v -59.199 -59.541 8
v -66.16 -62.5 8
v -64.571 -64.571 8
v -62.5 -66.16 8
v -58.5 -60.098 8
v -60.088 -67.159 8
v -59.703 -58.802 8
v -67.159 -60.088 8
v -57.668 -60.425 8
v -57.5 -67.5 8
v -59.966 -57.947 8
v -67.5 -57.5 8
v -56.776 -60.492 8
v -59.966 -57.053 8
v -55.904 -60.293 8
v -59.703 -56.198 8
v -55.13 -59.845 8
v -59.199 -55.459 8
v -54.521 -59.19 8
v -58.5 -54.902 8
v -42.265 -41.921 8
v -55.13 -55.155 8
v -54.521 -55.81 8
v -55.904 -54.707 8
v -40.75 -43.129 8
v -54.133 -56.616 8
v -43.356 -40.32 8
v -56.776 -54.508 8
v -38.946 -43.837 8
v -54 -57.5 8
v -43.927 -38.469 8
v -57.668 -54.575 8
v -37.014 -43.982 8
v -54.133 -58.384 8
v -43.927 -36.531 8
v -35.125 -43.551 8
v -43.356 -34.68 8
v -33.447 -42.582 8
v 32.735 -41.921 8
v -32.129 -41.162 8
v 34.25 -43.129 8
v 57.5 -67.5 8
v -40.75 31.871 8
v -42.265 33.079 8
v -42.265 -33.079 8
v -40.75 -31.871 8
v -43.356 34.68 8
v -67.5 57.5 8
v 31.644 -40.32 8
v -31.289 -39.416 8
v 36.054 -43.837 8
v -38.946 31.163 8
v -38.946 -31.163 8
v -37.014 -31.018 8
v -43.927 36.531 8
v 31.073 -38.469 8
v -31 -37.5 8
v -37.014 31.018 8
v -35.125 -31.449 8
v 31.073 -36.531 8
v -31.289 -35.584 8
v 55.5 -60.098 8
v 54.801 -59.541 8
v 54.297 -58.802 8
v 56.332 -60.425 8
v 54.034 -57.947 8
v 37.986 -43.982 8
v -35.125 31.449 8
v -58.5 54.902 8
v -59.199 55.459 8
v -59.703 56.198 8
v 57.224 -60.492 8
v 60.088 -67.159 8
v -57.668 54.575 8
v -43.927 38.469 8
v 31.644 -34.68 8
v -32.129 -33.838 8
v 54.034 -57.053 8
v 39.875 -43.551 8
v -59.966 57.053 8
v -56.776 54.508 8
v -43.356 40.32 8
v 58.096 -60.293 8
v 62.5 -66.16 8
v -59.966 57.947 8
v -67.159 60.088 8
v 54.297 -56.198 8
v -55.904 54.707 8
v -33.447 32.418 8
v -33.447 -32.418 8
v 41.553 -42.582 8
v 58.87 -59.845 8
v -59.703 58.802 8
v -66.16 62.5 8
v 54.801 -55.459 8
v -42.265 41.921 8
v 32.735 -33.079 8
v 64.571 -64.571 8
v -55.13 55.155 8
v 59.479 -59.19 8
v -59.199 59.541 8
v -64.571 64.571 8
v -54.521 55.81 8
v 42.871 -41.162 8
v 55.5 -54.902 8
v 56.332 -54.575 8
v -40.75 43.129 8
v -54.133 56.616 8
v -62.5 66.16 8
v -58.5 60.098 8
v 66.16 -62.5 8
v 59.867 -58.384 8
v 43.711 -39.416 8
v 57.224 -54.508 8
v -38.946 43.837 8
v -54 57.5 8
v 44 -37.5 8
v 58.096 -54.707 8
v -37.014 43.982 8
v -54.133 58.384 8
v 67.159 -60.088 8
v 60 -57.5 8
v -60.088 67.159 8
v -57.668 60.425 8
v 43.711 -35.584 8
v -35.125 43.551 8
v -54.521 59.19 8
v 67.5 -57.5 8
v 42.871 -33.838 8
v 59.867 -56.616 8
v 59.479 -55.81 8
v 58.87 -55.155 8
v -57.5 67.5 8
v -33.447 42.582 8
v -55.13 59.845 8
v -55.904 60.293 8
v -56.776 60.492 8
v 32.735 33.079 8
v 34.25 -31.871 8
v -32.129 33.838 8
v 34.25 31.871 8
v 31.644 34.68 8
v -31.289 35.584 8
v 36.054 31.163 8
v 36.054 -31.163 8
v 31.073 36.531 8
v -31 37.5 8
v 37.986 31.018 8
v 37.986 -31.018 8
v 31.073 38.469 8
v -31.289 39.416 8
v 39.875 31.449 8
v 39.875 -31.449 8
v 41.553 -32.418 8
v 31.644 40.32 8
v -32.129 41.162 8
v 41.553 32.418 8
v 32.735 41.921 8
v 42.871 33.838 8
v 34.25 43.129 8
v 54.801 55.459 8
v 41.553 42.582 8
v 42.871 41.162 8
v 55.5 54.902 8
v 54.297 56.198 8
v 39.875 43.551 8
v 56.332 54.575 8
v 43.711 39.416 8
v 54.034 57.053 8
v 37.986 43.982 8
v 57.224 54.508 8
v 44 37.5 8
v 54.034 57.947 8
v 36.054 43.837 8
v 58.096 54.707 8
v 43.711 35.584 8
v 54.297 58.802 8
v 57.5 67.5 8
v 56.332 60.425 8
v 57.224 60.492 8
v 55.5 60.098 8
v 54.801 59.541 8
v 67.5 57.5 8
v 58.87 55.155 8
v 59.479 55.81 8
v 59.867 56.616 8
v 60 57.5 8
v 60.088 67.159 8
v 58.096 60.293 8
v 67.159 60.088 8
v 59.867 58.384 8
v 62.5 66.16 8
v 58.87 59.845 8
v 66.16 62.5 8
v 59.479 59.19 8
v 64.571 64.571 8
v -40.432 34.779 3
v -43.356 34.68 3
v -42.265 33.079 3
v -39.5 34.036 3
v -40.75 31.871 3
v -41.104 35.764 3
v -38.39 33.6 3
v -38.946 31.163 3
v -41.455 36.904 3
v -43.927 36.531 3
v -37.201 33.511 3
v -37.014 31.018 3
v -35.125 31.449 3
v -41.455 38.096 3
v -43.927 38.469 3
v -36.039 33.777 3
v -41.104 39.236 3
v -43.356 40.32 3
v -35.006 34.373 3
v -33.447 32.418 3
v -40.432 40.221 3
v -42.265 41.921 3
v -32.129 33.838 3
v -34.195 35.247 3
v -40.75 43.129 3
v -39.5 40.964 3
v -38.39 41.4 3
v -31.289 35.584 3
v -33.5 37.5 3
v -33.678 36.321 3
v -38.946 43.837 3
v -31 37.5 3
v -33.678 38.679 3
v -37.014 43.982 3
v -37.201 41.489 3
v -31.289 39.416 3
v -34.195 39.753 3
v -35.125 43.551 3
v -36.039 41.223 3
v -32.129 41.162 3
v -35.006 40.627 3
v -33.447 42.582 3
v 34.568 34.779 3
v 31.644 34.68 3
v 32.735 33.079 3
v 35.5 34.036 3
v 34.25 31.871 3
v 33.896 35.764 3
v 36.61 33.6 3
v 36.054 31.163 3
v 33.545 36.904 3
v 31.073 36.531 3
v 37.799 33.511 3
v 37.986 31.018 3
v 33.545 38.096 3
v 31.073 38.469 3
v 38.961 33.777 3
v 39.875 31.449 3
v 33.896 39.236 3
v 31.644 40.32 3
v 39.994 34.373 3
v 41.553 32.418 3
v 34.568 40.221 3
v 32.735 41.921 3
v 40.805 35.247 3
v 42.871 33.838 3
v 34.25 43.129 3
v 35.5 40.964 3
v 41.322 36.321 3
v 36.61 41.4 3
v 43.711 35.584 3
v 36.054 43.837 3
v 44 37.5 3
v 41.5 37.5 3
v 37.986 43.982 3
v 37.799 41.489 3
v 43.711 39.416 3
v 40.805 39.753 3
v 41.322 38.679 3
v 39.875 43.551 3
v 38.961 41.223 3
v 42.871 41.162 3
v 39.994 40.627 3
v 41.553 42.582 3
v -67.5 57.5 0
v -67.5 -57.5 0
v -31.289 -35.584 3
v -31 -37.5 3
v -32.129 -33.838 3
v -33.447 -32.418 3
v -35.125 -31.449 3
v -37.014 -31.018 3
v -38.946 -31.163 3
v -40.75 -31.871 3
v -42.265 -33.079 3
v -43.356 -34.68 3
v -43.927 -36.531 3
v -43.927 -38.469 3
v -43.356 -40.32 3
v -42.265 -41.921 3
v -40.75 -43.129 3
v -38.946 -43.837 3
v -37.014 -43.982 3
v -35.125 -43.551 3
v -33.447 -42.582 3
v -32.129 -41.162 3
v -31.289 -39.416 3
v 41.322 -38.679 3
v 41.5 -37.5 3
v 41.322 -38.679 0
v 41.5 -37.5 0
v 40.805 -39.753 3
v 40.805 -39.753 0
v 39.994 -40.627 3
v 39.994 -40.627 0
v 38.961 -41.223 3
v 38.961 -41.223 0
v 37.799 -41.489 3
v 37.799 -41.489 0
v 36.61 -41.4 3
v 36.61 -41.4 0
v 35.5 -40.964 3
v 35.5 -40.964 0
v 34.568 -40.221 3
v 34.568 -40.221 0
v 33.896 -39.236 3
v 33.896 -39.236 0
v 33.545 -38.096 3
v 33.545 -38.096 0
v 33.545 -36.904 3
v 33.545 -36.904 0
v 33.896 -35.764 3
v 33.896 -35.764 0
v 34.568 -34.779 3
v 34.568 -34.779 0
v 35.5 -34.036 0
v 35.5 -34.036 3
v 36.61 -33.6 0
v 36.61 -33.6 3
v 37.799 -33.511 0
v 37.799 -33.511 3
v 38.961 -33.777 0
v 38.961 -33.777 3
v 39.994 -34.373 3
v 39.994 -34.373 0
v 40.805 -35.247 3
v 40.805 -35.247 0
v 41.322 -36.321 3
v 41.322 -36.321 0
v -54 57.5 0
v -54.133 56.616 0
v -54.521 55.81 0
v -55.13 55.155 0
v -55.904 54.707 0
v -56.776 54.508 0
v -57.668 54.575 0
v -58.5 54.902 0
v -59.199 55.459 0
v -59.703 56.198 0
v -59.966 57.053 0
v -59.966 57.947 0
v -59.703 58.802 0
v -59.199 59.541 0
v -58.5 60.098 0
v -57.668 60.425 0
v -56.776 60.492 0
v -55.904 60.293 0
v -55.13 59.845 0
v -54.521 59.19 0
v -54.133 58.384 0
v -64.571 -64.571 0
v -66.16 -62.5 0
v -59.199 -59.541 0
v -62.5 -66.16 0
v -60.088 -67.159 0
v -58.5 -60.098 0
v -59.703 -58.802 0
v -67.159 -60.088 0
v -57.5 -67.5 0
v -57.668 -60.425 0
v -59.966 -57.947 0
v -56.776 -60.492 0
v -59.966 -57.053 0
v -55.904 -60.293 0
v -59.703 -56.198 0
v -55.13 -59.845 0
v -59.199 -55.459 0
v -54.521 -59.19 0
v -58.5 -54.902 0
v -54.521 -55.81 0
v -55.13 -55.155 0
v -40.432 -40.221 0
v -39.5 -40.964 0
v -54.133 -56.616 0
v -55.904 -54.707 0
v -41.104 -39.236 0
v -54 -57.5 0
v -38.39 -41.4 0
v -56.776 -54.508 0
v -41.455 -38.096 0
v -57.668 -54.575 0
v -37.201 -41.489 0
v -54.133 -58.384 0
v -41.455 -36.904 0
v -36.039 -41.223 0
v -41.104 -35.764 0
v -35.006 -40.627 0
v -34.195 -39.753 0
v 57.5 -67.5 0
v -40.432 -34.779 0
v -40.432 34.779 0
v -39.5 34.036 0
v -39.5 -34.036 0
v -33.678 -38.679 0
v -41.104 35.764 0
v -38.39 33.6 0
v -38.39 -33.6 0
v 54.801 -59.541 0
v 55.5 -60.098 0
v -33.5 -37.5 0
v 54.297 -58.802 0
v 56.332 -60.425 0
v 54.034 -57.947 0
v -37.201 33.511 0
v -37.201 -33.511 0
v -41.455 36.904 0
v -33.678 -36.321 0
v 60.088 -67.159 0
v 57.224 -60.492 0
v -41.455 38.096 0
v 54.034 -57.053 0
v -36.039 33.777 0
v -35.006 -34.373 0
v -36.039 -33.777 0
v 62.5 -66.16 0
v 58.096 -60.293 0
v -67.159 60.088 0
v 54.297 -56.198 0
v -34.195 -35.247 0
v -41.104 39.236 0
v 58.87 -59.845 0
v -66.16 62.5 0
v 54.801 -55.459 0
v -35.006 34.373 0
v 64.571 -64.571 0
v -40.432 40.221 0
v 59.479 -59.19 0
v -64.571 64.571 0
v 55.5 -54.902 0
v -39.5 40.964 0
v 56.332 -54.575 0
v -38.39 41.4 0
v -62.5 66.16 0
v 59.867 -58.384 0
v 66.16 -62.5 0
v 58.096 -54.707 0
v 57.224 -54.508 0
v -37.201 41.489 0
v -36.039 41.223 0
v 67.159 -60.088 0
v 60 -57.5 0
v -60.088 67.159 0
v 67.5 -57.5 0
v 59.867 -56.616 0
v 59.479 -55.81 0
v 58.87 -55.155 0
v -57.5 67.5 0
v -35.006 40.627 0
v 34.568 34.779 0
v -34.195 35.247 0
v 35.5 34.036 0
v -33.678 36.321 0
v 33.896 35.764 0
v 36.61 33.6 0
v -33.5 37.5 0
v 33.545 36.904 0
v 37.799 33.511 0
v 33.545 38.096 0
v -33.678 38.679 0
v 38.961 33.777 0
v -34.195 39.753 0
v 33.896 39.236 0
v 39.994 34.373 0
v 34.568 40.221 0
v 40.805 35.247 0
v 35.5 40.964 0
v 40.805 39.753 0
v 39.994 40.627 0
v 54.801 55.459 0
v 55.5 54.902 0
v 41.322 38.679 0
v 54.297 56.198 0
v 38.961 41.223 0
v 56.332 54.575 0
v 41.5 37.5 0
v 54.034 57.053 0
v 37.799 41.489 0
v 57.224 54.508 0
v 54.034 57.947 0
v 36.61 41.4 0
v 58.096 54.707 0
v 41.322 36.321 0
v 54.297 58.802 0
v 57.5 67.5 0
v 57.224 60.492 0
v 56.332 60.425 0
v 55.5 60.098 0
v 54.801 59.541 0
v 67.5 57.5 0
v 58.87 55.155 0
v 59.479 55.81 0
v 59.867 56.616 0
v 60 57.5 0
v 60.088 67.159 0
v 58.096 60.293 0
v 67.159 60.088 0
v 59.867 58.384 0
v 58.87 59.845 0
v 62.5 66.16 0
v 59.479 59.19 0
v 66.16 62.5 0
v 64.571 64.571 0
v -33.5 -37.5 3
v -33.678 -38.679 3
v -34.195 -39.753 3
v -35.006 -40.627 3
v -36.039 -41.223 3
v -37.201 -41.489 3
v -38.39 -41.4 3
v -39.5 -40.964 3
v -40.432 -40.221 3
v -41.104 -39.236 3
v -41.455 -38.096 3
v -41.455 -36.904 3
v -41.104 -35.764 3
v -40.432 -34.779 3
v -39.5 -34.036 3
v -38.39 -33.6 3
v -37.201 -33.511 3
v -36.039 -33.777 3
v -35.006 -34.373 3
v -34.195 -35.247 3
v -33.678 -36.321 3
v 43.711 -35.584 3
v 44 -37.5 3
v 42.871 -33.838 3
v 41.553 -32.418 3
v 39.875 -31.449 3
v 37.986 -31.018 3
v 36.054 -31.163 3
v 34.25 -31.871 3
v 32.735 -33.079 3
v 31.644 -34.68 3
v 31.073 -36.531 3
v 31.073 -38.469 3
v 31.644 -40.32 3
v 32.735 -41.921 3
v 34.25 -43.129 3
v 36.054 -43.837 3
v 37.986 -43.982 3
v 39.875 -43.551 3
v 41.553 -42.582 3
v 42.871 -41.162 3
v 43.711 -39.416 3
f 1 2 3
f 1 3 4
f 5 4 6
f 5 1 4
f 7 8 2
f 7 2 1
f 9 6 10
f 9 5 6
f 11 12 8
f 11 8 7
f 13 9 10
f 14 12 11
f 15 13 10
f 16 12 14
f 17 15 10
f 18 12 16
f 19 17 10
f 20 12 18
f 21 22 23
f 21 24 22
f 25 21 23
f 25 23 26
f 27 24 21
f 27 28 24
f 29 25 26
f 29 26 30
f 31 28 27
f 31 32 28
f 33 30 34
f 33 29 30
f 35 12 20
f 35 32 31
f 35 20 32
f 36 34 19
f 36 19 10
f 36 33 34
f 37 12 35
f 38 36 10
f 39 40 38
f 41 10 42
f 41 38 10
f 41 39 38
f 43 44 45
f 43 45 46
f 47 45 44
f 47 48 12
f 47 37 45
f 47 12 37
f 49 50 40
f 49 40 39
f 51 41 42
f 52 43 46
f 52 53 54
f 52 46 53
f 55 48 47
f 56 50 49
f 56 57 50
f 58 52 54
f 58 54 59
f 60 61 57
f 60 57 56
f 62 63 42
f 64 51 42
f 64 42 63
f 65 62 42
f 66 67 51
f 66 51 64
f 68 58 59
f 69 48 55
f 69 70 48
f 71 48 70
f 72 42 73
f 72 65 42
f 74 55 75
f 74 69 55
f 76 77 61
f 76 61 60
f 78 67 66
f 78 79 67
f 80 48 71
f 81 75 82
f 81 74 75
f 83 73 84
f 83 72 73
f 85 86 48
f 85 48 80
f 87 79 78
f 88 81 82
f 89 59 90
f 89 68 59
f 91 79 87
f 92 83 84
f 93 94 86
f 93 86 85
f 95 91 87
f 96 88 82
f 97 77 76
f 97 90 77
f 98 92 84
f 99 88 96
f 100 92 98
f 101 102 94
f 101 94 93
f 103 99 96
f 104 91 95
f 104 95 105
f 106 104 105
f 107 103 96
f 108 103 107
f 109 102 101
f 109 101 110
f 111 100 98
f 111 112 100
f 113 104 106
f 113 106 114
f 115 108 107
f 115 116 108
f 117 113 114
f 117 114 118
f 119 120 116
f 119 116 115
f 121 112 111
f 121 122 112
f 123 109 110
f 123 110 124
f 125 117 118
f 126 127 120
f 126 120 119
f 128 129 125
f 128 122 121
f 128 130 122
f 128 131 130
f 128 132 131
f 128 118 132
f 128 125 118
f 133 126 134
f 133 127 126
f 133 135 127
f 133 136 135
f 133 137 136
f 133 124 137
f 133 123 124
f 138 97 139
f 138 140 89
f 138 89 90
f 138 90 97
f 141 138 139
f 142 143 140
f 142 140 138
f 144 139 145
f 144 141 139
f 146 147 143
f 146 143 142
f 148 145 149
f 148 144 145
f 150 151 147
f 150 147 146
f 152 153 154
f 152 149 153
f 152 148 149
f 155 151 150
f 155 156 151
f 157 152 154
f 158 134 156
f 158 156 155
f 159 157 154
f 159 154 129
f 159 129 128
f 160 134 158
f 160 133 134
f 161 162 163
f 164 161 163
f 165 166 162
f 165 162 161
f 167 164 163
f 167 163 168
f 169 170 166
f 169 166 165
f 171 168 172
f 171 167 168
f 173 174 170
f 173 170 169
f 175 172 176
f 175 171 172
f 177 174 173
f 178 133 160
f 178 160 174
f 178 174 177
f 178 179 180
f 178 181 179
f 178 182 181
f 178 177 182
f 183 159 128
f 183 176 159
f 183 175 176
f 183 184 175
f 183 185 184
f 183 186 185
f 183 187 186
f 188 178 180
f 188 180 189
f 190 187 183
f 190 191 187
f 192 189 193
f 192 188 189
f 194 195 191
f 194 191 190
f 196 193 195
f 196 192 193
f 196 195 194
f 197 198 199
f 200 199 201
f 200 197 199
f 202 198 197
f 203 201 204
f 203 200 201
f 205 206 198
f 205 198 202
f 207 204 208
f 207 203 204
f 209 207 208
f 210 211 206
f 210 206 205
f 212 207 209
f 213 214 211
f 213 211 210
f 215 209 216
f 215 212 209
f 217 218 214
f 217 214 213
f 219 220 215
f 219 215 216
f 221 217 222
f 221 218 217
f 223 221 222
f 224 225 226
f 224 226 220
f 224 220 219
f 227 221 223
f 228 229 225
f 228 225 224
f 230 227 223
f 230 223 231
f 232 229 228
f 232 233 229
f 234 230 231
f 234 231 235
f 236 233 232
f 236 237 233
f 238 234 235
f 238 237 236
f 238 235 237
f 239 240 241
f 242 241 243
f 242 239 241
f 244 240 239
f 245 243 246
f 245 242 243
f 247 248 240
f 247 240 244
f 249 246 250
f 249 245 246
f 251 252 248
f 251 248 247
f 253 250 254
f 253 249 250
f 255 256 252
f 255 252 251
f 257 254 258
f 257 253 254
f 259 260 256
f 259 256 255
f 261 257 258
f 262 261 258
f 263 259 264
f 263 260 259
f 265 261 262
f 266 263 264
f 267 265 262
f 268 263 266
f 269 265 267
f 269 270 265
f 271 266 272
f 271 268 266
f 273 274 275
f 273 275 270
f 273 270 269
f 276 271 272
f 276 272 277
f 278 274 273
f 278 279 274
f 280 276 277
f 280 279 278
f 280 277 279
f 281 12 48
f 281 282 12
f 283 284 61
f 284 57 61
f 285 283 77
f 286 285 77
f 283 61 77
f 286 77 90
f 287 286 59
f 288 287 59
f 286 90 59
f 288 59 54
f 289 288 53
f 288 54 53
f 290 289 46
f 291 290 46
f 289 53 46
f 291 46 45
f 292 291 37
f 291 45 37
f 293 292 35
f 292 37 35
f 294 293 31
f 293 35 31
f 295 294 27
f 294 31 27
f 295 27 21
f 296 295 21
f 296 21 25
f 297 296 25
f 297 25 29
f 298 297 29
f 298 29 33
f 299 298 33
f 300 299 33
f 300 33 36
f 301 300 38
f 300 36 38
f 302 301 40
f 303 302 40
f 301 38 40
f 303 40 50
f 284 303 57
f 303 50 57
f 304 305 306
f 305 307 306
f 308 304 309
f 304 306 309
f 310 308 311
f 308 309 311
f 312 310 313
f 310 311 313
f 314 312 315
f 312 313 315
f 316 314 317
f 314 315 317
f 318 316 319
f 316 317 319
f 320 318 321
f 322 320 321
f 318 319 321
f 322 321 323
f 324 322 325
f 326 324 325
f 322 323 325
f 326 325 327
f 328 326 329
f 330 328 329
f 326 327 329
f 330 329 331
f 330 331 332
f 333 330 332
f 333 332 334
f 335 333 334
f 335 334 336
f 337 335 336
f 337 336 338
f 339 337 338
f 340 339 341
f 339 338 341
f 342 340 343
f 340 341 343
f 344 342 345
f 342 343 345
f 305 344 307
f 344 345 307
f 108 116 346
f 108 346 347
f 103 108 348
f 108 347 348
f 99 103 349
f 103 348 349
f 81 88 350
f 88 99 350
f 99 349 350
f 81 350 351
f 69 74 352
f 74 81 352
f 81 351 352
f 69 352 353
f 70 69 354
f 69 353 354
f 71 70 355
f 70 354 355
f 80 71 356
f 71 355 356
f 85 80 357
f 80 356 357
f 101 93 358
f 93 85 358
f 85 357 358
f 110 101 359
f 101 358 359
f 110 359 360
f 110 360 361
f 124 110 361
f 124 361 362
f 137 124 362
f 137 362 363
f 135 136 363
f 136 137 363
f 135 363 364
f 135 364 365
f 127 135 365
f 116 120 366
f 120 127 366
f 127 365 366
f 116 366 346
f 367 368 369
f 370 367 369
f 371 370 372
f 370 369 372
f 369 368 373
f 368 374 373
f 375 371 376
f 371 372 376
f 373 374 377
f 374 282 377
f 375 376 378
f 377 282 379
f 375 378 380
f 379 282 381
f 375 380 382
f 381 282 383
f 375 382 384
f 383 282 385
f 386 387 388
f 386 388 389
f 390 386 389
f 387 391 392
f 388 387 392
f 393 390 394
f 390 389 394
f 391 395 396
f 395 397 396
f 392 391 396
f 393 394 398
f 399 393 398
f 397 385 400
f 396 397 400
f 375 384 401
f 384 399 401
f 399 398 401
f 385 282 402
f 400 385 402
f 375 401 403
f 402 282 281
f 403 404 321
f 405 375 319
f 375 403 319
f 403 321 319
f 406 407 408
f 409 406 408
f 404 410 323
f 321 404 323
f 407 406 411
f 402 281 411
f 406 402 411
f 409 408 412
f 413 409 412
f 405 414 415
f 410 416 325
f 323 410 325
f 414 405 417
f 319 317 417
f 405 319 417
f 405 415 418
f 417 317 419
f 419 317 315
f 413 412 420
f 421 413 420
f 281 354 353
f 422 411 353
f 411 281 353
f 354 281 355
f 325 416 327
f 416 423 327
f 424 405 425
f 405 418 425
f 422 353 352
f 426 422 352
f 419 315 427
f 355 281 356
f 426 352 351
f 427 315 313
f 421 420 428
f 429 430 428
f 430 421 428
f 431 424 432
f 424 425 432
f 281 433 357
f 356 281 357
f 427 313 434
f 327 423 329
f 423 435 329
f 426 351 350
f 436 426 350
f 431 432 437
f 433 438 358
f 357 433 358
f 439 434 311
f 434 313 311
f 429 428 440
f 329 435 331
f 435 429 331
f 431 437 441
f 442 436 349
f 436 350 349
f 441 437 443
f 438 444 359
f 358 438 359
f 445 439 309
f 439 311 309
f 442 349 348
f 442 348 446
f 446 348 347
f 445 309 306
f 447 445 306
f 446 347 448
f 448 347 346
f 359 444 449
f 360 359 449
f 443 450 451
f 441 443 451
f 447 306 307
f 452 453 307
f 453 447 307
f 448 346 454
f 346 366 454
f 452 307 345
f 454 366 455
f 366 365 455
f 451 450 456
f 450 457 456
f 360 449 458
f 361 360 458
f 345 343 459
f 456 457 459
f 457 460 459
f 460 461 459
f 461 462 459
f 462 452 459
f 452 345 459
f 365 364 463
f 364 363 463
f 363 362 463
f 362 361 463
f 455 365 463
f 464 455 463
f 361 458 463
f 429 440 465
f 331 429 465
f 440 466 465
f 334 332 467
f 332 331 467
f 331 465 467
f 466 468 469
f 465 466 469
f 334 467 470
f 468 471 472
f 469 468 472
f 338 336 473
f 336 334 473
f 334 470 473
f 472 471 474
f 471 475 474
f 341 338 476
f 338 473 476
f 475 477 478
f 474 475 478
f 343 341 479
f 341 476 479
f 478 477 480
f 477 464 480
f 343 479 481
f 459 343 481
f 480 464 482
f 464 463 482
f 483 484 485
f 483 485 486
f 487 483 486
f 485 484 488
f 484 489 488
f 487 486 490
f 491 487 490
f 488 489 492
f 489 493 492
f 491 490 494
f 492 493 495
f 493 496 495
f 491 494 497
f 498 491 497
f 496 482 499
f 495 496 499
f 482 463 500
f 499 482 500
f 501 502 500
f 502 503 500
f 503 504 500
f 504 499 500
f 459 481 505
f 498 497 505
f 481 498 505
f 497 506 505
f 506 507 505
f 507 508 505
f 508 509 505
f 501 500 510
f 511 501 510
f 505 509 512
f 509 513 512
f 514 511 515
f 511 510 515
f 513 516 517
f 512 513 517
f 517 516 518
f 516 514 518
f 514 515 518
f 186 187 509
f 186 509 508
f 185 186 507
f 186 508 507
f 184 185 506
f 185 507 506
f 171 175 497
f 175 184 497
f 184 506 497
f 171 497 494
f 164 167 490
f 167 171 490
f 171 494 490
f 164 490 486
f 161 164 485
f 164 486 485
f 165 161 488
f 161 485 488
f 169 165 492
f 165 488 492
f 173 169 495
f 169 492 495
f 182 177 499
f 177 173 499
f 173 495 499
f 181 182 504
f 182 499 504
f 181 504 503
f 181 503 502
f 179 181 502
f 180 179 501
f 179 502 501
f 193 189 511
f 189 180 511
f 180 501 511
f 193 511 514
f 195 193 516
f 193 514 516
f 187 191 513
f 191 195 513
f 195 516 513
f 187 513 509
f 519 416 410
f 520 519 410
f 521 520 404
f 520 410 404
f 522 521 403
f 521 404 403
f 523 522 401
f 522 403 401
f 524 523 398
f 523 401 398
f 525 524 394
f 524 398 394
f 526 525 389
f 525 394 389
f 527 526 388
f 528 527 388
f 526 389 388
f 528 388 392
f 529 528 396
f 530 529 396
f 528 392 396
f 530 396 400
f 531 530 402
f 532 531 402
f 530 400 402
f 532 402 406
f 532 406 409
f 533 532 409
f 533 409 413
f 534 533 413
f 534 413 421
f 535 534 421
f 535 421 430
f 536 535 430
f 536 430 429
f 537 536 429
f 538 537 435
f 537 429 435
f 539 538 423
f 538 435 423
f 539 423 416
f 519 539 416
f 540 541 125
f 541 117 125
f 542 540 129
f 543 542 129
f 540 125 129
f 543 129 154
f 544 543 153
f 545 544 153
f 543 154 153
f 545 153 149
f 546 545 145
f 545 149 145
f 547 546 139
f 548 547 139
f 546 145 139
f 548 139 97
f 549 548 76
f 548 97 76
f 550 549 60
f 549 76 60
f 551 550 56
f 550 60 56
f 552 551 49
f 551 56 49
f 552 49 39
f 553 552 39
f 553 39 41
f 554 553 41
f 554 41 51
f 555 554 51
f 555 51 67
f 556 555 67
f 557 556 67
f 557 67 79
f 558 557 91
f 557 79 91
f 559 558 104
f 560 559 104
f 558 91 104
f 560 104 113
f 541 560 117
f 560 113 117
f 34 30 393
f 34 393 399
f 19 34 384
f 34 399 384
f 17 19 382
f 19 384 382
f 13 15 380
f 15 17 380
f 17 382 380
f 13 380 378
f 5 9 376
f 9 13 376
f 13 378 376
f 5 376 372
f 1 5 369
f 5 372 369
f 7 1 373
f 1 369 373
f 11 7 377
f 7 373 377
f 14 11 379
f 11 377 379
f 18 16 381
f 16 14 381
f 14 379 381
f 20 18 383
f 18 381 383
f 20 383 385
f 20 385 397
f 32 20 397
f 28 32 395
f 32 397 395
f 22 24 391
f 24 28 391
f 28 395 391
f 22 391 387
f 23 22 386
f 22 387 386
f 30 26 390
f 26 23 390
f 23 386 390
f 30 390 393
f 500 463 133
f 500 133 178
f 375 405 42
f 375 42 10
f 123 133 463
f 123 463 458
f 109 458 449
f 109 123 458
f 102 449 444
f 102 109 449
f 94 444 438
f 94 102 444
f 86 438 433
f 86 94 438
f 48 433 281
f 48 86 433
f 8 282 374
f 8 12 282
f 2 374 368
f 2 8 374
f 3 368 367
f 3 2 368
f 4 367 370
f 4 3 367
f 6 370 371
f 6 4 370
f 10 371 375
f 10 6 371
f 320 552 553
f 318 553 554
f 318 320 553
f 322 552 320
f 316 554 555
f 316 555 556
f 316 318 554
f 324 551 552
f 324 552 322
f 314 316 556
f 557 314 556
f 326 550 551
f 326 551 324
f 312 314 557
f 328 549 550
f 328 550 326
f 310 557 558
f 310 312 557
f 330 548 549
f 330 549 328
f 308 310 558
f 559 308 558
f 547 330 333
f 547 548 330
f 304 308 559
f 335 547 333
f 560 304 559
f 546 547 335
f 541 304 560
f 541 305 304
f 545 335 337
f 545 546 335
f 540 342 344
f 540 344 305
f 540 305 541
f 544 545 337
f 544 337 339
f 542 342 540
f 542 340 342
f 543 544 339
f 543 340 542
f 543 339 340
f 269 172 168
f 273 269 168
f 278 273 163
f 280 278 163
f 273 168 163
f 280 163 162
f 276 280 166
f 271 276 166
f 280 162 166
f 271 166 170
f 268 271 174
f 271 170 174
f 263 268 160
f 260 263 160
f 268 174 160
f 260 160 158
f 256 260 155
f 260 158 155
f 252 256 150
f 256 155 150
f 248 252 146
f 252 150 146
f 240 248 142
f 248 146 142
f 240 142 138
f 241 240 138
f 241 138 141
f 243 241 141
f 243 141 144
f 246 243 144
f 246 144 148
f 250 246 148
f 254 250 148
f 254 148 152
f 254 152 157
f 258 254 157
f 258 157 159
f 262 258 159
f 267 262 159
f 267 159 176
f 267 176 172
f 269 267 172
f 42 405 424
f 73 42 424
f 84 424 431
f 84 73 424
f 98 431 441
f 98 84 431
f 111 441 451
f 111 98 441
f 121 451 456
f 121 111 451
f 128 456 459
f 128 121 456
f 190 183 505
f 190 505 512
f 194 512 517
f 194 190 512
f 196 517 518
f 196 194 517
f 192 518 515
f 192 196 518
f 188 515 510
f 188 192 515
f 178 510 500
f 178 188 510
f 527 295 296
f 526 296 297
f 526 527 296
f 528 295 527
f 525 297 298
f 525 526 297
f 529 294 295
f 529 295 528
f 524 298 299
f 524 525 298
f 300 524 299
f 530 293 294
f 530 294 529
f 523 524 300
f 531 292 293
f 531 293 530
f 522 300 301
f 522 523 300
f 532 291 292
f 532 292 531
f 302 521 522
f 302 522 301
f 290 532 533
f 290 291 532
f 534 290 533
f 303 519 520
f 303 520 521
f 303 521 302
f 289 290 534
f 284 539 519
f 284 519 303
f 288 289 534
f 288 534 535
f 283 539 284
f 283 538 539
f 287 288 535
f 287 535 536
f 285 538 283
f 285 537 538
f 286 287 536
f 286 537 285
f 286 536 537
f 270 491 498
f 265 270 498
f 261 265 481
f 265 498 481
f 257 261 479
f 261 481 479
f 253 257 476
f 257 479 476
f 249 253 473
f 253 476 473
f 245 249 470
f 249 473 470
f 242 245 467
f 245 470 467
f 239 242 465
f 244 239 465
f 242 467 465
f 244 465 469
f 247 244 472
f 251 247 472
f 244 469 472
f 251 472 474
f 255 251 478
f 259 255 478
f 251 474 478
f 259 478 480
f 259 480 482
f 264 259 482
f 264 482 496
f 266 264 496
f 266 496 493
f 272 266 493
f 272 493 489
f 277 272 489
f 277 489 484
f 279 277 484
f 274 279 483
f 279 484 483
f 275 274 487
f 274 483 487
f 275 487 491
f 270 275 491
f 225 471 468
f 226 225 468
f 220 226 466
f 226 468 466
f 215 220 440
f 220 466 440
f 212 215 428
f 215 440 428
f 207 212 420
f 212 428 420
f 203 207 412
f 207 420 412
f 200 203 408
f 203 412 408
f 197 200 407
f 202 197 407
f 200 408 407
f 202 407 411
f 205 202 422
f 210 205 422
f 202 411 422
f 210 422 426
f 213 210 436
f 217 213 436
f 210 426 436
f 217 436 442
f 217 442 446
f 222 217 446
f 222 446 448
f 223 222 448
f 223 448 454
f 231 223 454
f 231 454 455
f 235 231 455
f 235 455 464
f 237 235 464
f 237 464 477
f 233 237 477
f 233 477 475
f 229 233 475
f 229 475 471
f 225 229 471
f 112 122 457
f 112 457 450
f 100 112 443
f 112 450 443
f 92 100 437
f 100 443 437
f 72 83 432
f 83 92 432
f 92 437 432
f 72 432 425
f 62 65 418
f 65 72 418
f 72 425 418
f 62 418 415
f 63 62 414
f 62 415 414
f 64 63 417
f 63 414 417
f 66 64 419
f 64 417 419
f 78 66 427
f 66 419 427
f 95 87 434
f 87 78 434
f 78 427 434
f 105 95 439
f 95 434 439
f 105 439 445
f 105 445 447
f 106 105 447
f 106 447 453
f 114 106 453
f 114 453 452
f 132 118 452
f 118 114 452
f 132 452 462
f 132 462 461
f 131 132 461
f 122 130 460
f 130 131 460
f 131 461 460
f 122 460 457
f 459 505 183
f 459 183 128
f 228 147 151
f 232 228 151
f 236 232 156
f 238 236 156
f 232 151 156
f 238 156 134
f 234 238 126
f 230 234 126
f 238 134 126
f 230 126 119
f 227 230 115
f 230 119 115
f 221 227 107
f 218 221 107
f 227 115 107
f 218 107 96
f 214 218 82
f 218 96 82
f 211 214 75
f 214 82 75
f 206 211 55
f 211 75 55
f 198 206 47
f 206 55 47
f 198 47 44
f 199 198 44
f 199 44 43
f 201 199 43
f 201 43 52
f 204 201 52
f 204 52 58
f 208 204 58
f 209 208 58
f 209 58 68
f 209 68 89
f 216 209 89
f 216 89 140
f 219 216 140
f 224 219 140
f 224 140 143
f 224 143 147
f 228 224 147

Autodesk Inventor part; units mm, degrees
ref_plane "YZ Plane" through (0, 0, 0) normal (1, 0, 0) x (0, 1, 0)
ref_plane "XZ Plane" through (0, 0, 0) normal (0, 1, 0) x (-1, 0, 0)
ref_plane "XY Plane" through (0, 0, 0) normal (0, 0, 1) x (1, 0, 0)
sketch "Sketch1" plane through (0, 0, 0) normal (0, 0, 1) x (1, 0, 0)
  circle A0 centre (-57, 57.5) radius 3
  circle A1 centre (57, 57.5) radius 3
  circle A2 centre (-57, -57.5) radius 3
  circle A3 centre (57, -57.5) radius 3
  line L0 (-57, 57.5) -> (57, -57.5) construction
  line L1 (-57, -57.5) -> (57, 57.5) construction
  line L2 (-67.5, 67.5) -> (67.5, 67.5)
  line L3 (67.5, 67.5) -> (67.5, -67.5)
  line L4 (67.5, -67.5) -> (-67.5, -67.5)
  line L5 (-67.5, -67.5) -> (-67.5, 67.5)
  line L6 (-67.5, 67.5) -> (67.5, -67.5) construction
  line L7 (67.5, 67.5) -> (-67.5, -67.5) construction
  circle A4 centre (-37.5, 37.5) radius 4
  circle A5 centre (-37.5, -37.5) radius 4
  circle A6 centre (37.5, -37.5) radius 4
  circle A7 centre (37.5, 37.5) radius 4
  point P0 (0, 0)
  point P1 (0, 0)
  dimension "d0" = 114
  dimension "d1" = 115
  dimension "d2" = 6
  dimension "d3" = 135
  dimension "d4" = 135
  dimension "d5" = 8
  dimension "d6" = 30
  dimension "d9" = 360
extrude "Extrusion1" add sketch "Sketch1" along normal blind 8
sketch "Sketch2" plane through (0, 0, 8) normal (0, 0, 1) x (1, 0, 0)
  line L0 (-67.5, -67.5) -> (67.5, -67.5) projected
  line L1 (67.5, -67.5) -> (67.5, 67.5) projected
  line L2 (67.5, 67.5) -> (-67.5, 67.5) projected
  line L3 (-67.5, 67.5) -> (-67.5, -67.5) projected
  circle A0 centre (37.5, 37.5) radius 4 projected
  circle A1 centre (37.5, -37.5) radius 4 projected
  circle A2 centre (-37.5, -37.5) radius 4 projected
  circle A3 centre (-37.5, 37.5) radius 4 projected
  circle A4 centre (57, -57.5) radius 3 projected
  circle A5 centre (-57, -57.5) radius 3 projected
  circle A6 centre (57, 57.5) radius 3 projected
  circle A7 centre (-57, 57.5) radius 3 projected
  circle A8 centre (-37.5, 37.5) radius 6.5
  circle A9 centre (-37.5, -37.5) radius 6.5
  circle A10 centre (37.5, -37.5) radius 6.5
  circle A11 centre (37.5, 37.5) radius 6.5
  point P0 (0, 0)
  dimension "d13" = 13
  dimension "d16" = 360
extrude "Extrusion2" cut sketch "Sketch2" against normal blind 5 contours A0 | A1 | A2 | A3 | A8 | A9 | A10 | A11
fillet "Fillet1" radius 10 4 edges at (-67.5, 67.5, 4) (67.5, 67.5, 4) (-67.5, -67.5, 4) (67.5, -67.5, 4)
thread "Thread1" size "M6x1" class "6H" standard "ANSI Metric M Profile" full length
thread "Thread2" size "M6x1" class "6H" standard "ANSI Metric M Profile" full length
thread "Thread3" size "M6x1" class "6H" standard "ANSI Metric M Profile" full length
thread "Thread4" size "M6x1" class "6H" standard "ANSI Metric M Profile" full length
properties part number "plaat aan stoel" material "Aluminum 6061"
